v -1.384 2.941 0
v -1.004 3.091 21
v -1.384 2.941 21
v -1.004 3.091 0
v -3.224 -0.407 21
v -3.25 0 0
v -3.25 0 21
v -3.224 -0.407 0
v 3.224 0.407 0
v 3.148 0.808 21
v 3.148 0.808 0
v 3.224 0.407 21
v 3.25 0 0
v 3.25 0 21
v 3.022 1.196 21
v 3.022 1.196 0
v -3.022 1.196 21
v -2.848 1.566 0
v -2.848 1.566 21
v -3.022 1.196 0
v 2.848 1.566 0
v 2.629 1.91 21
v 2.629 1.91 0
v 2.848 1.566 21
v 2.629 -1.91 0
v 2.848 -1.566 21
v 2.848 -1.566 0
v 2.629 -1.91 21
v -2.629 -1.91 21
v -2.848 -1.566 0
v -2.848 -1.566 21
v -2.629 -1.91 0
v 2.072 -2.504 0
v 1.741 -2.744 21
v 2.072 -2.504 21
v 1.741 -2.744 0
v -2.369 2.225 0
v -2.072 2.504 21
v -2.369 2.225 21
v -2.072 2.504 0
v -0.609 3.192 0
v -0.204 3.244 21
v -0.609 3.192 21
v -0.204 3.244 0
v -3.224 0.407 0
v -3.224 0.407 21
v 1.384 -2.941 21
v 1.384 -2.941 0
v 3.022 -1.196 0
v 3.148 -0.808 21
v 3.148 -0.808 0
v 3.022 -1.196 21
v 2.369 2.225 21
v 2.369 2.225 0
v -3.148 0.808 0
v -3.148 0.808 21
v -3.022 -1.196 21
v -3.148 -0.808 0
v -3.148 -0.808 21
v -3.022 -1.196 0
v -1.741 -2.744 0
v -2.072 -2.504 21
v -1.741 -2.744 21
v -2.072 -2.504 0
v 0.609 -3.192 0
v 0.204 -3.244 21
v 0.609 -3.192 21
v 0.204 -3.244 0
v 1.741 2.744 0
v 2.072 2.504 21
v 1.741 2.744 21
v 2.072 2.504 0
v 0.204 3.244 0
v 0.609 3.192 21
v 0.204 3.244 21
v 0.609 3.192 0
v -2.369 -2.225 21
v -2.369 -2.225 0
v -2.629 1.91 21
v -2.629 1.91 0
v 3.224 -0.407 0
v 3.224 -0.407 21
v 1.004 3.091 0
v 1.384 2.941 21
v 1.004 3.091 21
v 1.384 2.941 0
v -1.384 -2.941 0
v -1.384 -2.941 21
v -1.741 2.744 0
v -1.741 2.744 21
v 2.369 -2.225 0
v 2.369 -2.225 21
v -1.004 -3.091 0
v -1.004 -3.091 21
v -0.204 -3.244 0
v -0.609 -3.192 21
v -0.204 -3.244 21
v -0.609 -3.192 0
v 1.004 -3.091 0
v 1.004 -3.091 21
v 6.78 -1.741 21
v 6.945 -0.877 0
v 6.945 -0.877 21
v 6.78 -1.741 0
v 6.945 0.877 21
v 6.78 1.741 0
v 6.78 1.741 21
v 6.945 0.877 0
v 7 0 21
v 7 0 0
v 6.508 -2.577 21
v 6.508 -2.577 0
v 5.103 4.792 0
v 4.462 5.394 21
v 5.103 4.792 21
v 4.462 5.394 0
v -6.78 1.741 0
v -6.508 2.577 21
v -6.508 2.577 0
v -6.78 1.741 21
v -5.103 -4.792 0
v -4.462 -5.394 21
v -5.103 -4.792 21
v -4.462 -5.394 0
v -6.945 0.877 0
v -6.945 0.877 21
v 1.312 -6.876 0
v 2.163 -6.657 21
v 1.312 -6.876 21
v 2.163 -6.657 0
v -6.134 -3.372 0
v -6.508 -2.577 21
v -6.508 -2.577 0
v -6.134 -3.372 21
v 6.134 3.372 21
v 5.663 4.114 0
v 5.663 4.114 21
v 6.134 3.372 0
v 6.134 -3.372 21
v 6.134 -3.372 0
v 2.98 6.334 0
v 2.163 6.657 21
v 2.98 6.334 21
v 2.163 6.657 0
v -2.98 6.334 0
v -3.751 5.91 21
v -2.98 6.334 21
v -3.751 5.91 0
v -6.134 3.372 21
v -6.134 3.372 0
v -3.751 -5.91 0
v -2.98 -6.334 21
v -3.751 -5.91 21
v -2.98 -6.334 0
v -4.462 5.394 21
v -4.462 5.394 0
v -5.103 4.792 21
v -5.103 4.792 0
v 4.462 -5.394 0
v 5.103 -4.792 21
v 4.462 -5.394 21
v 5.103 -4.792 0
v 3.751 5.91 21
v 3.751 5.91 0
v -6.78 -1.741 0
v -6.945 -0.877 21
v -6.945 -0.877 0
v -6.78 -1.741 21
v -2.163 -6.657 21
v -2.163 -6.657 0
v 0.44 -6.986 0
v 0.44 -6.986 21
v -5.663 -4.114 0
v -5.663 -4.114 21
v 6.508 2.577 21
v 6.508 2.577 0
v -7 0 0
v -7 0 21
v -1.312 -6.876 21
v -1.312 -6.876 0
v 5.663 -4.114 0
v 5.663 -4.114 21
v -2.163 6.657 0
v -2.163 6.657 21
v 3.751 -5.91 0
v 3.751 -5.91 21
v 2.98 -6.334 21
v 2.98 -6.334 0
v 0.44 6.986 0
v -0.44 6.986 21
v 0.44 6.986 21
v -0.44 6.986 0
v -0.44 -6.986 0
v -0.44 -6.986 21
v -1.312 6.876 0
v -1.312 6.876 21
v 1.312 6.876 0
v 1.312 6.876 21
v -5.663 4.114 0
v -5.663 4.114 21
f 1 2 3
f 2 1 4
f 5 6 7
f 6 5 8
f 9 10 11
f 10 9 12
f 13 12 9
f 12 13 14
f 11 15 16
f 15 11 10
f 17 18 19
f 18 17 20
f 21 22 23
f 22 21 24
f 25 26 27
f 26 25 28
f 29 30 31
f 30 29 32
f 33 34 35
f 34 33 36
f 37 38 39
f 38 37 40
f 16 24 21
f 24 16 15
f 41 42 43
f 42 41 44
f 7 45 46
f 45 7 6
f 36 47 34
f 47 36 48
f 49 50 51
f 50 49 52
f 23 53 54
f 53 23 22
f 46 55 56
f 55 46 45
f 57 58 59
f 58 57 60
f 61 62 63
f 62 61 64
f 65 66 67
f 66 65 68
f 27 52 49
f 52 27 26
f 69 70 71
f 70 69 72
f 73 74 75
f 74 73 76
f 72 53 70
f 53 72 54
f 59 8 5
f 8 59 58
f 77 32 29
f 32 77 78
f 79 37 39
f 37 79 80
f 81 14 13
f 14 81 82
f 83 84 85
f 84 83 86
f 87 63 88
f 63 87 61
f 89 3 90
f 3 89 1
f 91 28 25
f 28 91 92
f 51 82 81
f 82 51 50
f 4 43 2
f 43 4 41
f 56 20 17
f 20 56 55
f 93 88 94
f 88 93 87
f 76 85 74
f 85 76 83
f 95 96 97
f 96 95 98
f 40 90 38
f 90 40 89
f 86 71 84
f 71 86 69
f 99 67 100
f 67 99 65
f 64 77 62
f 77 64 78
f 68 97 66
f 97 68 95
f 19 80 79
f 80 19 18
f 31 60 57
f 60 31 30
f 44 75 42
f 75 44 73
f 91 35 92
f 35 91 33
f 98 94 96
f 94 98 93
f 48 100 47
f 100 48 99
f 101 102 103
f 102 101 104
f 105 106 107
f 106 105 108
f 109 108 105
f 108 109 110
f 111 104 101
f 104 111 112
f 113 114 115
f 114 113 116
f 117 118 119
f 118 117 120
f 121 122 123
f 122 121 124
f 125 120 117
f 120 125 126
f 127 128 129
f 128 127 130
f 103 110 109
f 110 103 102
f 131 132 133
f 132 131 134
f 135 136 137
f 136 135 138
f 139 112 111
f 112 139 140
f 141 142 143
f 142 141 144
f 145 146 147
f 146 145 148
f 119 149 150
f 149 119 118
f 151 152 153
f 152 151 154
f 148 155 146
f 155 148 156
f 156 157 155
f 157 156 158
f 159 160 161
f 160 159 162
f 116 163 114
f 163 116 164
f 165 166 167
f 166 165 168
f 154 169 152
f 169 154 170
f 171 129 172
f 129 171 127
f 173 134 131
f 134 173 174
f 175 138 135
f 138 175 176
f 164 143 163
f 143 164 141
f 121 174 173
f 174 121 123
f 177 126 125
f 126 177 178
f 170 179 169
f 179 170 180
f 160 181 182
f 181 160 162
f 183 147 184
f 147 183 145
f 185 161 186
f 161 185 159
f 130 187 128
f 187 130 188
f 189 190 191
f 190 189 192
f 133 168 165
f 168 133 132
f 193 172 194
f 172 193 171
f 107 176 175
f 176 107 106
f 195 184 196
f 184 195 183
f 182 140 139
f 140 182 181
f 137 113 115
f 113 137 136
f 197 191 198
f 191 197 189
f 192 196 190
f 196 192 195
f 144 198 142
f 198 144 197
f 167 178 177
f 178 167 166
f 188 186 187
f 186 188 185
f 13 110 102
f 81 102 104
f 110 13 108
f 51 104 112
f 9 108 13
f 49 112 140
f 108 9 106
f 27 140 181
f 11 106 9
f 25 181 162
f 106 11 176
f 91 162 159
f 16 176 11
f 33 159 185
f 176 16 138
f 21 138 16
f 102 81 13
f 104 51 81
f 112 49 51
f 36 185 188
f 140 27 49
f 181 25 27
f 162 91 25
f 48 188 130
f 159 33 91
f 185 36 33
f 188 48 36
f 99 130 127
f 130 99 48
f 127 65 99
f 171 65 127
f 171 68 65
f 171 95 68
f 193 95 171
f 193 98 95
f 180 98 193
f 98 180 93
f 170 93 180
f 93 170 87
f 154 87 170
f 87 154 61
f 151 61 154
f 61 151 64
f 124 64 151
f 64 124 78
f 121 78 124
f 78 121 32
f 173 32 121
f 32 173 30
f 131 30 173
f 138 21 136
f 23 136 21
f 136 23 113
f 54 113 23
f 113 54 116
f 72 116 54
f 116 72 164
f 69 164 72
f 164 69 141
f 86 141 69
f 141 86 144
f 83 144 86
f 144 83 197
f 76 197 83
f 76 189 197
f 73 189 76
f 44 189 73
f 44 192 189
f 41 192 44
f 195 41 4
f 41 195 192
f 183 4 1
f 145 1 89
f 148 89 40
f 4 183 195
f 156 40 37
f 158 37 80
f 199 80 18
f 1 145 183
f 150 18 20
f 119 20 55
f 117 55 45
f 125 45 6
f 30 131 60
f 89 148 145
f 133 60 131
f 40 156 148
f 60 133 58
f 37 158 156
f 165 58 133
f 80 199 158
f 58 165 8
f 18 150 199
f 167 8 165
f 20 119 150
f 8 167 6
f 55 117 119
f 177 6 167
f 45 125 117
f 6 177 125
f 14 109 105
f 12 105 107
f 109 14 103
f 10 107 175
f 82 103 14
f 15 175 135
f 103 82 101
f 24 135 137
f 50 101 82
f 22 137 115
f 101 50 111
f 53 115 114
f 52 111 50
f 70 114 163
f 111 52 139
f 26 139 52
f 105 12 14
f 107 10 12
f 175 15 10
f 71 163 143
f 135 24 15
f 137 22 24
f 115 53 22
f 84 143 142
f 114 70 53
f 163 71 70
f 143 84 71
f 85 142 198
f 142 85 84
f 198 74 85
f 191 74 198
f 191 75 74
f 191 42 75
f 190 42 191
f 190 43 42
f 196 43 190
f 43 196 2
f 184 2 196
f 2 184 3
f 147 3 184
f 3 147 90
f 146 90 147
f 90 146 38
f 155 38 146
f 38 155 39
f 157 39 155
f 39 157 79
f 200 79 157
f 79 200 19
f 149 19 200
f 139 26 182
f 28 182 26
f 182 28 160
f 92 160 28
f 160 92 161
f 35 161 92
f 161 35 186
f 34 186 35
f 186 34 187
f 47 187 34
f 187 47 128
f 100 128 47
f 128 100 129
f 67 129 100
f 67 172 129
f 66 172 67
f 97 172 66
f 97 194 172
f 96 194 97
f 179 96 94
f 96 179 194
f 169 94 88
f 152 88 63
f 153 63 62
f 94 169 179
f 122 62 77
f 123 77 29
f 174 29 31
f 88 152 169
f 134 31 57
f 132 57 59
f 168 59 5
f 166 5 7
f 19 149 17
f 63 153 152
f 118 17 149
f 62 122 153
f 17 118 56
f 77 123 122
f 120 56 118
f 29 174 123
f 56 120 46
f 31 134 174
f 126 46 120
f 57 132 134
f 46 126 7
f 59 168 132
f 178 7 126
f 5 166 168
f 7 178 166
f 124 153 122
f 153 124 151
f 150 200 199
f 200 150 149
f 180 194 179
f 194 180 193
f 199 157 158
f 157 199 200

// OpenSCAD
$fn = 50;


difference() {
	union() {
		cylinder(h = 21, r = 7.0000000000);
	}
	union() {
		translate(v = [0.0000000000, 0.0000000000, -100.0000000000]) {
			cylinder(h = 200, r = 3.2500000000);
		}
		translate(v = [0.0000000000, 0.0000000000, -100.0000000000]) {
			cylinder(h = 200, r = 3.2500000000);
		}
		translate(v = [0.0000000000, 0.0000000000, -100.0000000000]) {
			cylinder(h = 200, r = 3.2500000000);
		}
		translate(v = [0.0000000000, 0.0000000000, -100.0000000000]) {
			cylinder(h = 200, r = 3.2500000000);
		}
	}
}
